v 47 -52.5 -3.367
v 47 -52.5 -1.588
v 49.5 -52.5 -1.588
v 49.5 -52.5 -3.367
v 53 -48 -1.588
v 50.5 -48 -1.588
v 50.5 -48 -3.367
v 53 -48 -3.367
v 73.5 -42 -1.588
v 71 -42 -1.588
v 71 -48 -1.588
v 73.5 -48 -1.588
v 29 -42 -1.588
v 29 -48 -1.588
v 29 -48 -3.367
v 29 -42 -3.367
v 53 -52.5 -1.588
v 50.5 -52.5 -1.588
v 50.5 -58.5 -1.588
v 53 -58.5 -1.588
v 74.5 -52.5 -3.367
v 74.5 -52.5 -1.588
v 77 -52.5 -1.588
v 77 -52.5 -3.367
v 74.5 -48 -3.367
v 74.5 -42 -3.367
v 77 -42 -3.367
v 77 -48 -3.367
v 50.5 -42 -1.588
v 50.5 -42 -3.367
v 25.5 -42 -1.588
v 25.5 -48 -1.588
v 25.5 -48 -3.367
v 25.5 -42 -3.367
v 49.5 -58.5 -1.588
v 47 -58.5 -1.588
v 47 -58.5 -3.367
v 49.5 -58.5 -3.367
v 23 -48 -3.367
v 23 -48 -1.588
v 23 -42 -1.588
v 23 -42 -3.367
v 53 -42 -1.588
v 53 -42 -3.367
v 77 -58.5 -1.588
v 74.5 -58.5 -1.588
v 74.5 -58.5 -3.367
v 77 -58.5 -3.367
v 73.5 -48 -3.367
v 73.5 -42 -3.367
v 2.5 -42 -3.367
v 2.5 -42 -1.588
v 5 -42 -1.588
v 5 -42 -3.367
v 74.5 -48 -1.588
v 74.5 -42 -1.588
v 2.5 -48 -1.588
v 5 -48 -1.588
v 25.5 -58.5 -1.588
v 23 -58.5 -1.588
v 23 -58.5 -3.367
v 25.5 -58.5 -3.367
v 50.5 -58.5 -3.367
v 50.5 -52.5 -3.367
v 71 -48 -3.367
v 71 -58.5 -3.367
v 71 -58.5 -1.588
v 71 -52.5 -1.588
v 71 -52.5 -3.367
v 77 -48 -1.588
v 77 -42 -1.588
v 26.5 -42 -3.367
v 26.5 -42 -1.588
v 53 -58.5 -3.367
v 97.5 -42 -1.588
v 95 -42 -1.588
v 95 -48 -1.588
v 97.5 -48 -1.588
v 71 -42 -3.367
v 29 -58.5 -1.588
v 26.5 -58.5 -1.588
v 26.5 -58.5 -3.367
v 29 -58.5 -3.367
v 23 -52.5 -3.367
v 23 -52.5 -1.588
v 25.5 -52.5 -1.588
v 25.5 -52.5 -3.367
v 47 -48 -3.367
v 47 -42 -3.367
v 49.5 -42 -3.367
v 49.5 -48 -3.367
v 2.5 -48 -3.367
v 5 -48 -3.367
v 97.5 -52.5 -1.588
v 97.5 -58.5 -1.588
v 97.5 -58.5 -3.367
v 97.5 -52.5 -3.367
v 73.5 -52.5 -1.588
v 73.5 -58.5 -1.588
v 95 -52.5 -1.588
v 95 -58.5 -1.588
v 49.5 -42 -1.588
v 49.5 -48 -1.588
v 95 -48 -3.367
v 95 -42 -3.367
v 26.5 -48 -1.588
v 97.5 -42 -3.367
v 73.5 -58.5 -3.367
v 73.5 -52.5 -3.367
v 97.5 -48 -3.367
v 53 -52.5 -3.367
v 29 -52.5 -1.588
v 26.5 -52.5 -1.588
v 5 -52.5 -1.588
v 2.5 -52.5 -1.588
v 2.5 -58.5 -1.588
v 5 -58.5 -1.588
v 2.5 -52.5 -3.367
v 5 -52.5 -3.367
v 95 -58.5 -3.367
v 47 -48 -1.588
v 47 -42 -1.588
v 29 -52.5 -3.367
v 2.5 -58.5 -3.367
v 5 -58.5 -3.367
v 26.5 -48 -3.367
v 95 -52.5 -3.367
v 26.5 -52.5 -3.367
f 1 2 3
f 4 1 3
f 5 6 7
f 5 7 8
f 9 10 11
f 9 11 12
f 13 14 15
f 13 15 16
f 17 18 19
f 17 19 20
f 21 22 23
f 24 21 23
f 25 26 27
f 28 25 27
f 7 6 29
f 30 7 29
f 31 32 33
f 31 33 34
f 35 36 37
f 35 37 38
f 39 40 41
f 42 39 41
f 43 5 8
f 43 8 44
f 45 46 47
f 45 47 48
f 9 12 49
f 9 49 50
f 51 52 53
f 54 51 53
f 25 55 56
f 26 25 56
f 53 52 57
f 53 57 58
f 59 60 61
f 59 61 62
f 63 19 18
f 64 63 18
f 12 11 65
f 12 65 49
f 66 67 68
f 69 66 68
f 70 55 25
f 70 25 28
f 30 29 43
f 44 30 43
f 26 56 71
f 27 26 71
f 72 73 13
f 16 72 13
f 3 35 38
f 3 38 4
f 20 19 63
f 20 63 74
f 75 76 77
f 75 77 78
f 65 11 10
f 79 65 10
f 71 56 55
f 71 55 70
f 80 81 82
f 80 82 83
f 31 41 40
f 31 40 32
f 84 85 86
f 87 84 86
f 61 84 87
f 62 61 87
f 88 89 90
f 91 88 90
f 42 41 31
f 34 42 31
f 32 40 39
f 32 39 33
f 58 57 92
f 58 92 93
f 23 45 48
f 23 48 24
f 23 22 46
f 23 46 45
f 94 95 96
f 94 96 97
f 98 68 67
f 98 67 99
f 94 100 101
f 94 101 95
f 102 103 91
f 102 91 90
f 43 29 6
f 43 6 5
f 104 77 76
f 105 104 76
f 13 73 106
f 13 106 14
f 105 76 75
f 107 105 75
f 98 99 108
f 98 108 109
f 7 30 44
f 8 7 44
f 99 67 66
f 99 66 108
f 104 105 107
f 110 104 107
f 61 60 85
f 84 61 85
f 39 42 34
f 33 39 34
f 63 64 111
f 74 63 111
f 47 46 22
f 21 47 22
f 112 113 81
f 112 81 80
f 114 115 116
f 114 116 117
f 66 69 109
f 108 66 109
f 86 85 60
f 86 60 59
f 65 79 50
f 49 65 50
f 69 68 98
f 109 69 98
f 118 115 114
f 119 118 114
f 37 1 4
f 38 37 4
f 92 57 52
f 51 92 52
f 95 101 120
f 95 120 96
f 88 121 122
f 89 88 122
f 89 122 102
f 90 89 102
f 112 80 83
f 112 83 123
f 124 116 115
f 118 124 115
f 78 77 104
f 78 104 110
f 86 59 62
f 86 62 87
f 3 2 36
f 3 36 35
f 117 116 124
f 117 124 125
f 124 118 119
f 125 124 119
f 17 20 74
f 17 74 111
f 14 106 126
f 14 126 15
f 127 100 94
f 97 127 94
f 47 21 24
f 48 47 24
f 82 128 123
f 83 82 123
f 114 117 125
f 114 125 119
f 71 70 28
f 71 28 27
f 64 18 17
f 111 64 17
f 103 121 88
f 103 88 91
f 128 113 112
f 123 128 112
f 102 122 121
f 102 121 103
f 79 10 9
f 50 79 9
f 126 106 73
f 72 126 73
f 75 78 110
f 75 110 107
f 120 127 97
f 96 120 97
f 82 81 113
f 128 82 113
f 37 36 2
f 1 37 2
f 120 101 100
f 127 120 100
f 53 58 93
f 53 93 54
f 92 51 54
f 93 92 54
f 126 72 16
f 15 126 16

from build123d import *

# Parameters (mm, degrees)
SKETCH11_W             = 2.5
SKETCH11_H             = 6
BOSS_EXTRUDE5_DEPTH    = 1.78
BOSS_EXTRUDE5_2_DEPTH  = 1.78
BOSS_EXTRUDE5_3_DEPTH  = 1.78
BOSS_EXTRUDE5_4_DEPTH  = 1.78
BOSS_EXTRUDE5_5_DEPTH  = 1.78
BOSS_EXTRUDE5_6_DEPTH  = 1.78
BOSS_EXTRUDE5_7_DEPTH  = 1.78
BOSS_EXTRUDE5_8_DEPTH  = 1.78
BOSS_EXTRUDE5_9_DEPTH  = 1.78
BOSS_EXTRUDE5_10_DEPTH = 1.78
BOSS_EXTRUDE5_11_DEPTH = 1.78
BOSS_EXTRUDE5_12_DEPTH = 1.78
BOSS_EXTRUDE5_13_DEPTH = 1.78
BOSS_EXTRUDE5_14_DEPTH = 1.78
BOSS_EXTRUDE5_15_DEPTH = 1.78
BOSS_EXTRUDE5_16_DEPTH = 1.78


with BuildPart() as part:
    # Sketch11 → Boss-Extrude5 (new body)
    with BuildSketch(Plane.XY.offset(-1.5875)):
        with Locations((24.25, -45)):
            Rectangle(SKETCH11_W, SKETCH11_H)
    extrude(amount=-BOSS_EXTRUDE5_DEPTH)


with BuildPart() as body_2:
    # Sketch11 → Boss-Extrude5 2 (new body)
    with BuildSketch(Plane.XY.offset(-1.5875)):
        with Locations((3.75, -45)):
            Rectangle(SKETCH11_W, SKETCH11_H)
    extrude(amount=-BOSS_EXTRUDE5_2_DEPTH)


with BuildPart() as body_3:
    # Sketch11 → Boss-Extrude5 3 (new body)
    with BuildSketch(Plane.XY.offset(-1.5875)):
        with Locations((3.75, -55.5)):
            Rectangle(SKETCH11_W, SKETCH11_H)
    extrude(amount=-BOSS_EXTRUDE5_3_DEPTH)


with BuildPart() as body_4:
    # Sketch11 → Boss-Extrude5 4 (new body)
    with BuildSketch(Plane.XY.offset(-1.5875)):
        with Locations((24.25, -55.5)):
            Rectangle(SKETCH11_W, SKETCH11_H)
    extrude(amount=-BOSS_EXTRUDE5_4_DEPTH)


with BuildPart() as body_5:
    # Sketch11 → Boss-Extrude5 5 (new body)
    with BuildSketch(Plane.XY.offset(-1.5875)):
        with Locations((48.25, -45)):
            Rectangle(SKETCH11_W, SKETCH11_H)
    extrude(amount=-BOSS_EXTRUDE5_5_DEPTH)


with BuildPart() as body_6:
    # Sketch11 → Boss-Extrude5 6 (new body)
    with BuildSketch(Plane.XY.offset(-1.5875)):
        with Locations((27.75, -45)):
            Rectangle(SKETCH11_W, SKETCH11_H)
    extrude(amount=-BOSS_EXTRUDE5_6_DEPTH)


with BuildPart() as body_7:
    # Sketch11 → Boss-Extrude5 7 (new body)
    with BuildSketch(Plane.XY.offset(-1.5875)):
        with Locations((27.75, -55.5)):
            Rectangle(SKETCH11_W, SKETCH11_H)
    extrude(amount=-BOSS_EXTRUDE5_7_DEPTH)


with BuildPart() as body_8:
    # Sketch11 → Boss-Extrude5 8 (new body)
    with BuildSketch(Plane.XY.offset(-1.5875)):
        with Locations((48.25, -55.5)):
            Rectangle(SKETCH11_W, SKETCH11_H)
    extrude(amount=-BOSS_EXTRUDE5_8_DEPTH)


with BuildPart() as body_9:
    # Sketch11 → Boss-Extrude5 9 (new body)
    with BuildSketch(Plane.XY.offset(-1.5875)):
        with Locations((72.25, -45)):
            Rectangle(SKETCH11_W, SKETCH11_H)
    extrude(amount=-BOSS_EXTRUDE5_9_DEPTH)


with BuildPart() as body_10:
    # Sketch11 → Boss-Extrude5 10 (new body)
    with BuildSketch(Plane.XY.offset(-1.5875)):
        with Locations((51.75, -45)):
            Rectangle(SKETCH11_W, SKETCH11_H)
    extrude(amount=-BOSS_EXTRUDE5_10_DEPTH)


with BuildPart() as body_11:
    # Sketch11 → Boss-Extrude5 11 (new body)
    with BuildSketch(Plane.XY.offset(-1.5875)):
        with Locations((51.75, -55.5)):
            Rectangle(SKETCH11_W, SKETCH11_H)
    extrude(amount=-BOSS_EXTRUDE5_11_DEPTH)


with BuildPart() as body_12:
    # Sketch11 → Boss-Extrude5 12 (new body)
    with BuildSketch(Plane.XY.offset(-1.5875)):
        with Locations((72.25, -55.5)):
            Rectangle(SKETCH11_W, SKETCH11_H)
    extrude(amount=-BOSS_EXTRUDE5_12_DEPTH)


with BuildPart() as body_13:
    # Sketch11 → Boss-Extrude5 13 (new body)
    with BuildSketch(Plane.XY.offset(-1.5875)):
        with Locations((96.25, -45)):
            Rectangle(SKETCH11_W, SKETCH11_H)
    extrude(amount=-BOSS_EXTRUDE5_13_DEPTH)


with BuildPart() as body_14:
    # Sketch11 → Boss-Extrude5 14 (new body)
    with BuildSketch(Plane.XY.offset(-1.5875)):
        with Locations((75.75, -45)):
            Rectangle(SKETCH11_W, SKETCH11_H)
    extrude(amount=-BOSS_EXTRUDE5_14_DEPTH)


with BuildPart() as body_15:
    # Sketch11 → Boss-Extrude5 15 (new body)
    with BuildSketch(Plane.XY.offset(-1.5875)):
        with Locations((75.75, -55.5)):
            Rectangle(SKETCH11_W, SKETCH11_H)
    extrude(amount=-BOSS_EXTRUDE5_15_DEPTH)


with BuildPart() as body_16:
    # Sketch11 → Boss-Extrude5 16 (new body)
    with BuildSketch(Plane.XY.offset(-1.5875)):
        with Locations((96.25, -55.5)):
            Rectangle(SKETCH11_W, SKETCH11_H)
    extrude(amount=-BOSS_EXTRUDE5_16_DEPTH)


solid = Compound([part.part, body_2.part, body_3.part, body_4.part, body_5.part, body_6.part, body_7.part, body_8.part, body_9.part, body_10.part, body_11.part, body_12.part, body_13.part, body_14.part, body_15.part, body_16.part])
